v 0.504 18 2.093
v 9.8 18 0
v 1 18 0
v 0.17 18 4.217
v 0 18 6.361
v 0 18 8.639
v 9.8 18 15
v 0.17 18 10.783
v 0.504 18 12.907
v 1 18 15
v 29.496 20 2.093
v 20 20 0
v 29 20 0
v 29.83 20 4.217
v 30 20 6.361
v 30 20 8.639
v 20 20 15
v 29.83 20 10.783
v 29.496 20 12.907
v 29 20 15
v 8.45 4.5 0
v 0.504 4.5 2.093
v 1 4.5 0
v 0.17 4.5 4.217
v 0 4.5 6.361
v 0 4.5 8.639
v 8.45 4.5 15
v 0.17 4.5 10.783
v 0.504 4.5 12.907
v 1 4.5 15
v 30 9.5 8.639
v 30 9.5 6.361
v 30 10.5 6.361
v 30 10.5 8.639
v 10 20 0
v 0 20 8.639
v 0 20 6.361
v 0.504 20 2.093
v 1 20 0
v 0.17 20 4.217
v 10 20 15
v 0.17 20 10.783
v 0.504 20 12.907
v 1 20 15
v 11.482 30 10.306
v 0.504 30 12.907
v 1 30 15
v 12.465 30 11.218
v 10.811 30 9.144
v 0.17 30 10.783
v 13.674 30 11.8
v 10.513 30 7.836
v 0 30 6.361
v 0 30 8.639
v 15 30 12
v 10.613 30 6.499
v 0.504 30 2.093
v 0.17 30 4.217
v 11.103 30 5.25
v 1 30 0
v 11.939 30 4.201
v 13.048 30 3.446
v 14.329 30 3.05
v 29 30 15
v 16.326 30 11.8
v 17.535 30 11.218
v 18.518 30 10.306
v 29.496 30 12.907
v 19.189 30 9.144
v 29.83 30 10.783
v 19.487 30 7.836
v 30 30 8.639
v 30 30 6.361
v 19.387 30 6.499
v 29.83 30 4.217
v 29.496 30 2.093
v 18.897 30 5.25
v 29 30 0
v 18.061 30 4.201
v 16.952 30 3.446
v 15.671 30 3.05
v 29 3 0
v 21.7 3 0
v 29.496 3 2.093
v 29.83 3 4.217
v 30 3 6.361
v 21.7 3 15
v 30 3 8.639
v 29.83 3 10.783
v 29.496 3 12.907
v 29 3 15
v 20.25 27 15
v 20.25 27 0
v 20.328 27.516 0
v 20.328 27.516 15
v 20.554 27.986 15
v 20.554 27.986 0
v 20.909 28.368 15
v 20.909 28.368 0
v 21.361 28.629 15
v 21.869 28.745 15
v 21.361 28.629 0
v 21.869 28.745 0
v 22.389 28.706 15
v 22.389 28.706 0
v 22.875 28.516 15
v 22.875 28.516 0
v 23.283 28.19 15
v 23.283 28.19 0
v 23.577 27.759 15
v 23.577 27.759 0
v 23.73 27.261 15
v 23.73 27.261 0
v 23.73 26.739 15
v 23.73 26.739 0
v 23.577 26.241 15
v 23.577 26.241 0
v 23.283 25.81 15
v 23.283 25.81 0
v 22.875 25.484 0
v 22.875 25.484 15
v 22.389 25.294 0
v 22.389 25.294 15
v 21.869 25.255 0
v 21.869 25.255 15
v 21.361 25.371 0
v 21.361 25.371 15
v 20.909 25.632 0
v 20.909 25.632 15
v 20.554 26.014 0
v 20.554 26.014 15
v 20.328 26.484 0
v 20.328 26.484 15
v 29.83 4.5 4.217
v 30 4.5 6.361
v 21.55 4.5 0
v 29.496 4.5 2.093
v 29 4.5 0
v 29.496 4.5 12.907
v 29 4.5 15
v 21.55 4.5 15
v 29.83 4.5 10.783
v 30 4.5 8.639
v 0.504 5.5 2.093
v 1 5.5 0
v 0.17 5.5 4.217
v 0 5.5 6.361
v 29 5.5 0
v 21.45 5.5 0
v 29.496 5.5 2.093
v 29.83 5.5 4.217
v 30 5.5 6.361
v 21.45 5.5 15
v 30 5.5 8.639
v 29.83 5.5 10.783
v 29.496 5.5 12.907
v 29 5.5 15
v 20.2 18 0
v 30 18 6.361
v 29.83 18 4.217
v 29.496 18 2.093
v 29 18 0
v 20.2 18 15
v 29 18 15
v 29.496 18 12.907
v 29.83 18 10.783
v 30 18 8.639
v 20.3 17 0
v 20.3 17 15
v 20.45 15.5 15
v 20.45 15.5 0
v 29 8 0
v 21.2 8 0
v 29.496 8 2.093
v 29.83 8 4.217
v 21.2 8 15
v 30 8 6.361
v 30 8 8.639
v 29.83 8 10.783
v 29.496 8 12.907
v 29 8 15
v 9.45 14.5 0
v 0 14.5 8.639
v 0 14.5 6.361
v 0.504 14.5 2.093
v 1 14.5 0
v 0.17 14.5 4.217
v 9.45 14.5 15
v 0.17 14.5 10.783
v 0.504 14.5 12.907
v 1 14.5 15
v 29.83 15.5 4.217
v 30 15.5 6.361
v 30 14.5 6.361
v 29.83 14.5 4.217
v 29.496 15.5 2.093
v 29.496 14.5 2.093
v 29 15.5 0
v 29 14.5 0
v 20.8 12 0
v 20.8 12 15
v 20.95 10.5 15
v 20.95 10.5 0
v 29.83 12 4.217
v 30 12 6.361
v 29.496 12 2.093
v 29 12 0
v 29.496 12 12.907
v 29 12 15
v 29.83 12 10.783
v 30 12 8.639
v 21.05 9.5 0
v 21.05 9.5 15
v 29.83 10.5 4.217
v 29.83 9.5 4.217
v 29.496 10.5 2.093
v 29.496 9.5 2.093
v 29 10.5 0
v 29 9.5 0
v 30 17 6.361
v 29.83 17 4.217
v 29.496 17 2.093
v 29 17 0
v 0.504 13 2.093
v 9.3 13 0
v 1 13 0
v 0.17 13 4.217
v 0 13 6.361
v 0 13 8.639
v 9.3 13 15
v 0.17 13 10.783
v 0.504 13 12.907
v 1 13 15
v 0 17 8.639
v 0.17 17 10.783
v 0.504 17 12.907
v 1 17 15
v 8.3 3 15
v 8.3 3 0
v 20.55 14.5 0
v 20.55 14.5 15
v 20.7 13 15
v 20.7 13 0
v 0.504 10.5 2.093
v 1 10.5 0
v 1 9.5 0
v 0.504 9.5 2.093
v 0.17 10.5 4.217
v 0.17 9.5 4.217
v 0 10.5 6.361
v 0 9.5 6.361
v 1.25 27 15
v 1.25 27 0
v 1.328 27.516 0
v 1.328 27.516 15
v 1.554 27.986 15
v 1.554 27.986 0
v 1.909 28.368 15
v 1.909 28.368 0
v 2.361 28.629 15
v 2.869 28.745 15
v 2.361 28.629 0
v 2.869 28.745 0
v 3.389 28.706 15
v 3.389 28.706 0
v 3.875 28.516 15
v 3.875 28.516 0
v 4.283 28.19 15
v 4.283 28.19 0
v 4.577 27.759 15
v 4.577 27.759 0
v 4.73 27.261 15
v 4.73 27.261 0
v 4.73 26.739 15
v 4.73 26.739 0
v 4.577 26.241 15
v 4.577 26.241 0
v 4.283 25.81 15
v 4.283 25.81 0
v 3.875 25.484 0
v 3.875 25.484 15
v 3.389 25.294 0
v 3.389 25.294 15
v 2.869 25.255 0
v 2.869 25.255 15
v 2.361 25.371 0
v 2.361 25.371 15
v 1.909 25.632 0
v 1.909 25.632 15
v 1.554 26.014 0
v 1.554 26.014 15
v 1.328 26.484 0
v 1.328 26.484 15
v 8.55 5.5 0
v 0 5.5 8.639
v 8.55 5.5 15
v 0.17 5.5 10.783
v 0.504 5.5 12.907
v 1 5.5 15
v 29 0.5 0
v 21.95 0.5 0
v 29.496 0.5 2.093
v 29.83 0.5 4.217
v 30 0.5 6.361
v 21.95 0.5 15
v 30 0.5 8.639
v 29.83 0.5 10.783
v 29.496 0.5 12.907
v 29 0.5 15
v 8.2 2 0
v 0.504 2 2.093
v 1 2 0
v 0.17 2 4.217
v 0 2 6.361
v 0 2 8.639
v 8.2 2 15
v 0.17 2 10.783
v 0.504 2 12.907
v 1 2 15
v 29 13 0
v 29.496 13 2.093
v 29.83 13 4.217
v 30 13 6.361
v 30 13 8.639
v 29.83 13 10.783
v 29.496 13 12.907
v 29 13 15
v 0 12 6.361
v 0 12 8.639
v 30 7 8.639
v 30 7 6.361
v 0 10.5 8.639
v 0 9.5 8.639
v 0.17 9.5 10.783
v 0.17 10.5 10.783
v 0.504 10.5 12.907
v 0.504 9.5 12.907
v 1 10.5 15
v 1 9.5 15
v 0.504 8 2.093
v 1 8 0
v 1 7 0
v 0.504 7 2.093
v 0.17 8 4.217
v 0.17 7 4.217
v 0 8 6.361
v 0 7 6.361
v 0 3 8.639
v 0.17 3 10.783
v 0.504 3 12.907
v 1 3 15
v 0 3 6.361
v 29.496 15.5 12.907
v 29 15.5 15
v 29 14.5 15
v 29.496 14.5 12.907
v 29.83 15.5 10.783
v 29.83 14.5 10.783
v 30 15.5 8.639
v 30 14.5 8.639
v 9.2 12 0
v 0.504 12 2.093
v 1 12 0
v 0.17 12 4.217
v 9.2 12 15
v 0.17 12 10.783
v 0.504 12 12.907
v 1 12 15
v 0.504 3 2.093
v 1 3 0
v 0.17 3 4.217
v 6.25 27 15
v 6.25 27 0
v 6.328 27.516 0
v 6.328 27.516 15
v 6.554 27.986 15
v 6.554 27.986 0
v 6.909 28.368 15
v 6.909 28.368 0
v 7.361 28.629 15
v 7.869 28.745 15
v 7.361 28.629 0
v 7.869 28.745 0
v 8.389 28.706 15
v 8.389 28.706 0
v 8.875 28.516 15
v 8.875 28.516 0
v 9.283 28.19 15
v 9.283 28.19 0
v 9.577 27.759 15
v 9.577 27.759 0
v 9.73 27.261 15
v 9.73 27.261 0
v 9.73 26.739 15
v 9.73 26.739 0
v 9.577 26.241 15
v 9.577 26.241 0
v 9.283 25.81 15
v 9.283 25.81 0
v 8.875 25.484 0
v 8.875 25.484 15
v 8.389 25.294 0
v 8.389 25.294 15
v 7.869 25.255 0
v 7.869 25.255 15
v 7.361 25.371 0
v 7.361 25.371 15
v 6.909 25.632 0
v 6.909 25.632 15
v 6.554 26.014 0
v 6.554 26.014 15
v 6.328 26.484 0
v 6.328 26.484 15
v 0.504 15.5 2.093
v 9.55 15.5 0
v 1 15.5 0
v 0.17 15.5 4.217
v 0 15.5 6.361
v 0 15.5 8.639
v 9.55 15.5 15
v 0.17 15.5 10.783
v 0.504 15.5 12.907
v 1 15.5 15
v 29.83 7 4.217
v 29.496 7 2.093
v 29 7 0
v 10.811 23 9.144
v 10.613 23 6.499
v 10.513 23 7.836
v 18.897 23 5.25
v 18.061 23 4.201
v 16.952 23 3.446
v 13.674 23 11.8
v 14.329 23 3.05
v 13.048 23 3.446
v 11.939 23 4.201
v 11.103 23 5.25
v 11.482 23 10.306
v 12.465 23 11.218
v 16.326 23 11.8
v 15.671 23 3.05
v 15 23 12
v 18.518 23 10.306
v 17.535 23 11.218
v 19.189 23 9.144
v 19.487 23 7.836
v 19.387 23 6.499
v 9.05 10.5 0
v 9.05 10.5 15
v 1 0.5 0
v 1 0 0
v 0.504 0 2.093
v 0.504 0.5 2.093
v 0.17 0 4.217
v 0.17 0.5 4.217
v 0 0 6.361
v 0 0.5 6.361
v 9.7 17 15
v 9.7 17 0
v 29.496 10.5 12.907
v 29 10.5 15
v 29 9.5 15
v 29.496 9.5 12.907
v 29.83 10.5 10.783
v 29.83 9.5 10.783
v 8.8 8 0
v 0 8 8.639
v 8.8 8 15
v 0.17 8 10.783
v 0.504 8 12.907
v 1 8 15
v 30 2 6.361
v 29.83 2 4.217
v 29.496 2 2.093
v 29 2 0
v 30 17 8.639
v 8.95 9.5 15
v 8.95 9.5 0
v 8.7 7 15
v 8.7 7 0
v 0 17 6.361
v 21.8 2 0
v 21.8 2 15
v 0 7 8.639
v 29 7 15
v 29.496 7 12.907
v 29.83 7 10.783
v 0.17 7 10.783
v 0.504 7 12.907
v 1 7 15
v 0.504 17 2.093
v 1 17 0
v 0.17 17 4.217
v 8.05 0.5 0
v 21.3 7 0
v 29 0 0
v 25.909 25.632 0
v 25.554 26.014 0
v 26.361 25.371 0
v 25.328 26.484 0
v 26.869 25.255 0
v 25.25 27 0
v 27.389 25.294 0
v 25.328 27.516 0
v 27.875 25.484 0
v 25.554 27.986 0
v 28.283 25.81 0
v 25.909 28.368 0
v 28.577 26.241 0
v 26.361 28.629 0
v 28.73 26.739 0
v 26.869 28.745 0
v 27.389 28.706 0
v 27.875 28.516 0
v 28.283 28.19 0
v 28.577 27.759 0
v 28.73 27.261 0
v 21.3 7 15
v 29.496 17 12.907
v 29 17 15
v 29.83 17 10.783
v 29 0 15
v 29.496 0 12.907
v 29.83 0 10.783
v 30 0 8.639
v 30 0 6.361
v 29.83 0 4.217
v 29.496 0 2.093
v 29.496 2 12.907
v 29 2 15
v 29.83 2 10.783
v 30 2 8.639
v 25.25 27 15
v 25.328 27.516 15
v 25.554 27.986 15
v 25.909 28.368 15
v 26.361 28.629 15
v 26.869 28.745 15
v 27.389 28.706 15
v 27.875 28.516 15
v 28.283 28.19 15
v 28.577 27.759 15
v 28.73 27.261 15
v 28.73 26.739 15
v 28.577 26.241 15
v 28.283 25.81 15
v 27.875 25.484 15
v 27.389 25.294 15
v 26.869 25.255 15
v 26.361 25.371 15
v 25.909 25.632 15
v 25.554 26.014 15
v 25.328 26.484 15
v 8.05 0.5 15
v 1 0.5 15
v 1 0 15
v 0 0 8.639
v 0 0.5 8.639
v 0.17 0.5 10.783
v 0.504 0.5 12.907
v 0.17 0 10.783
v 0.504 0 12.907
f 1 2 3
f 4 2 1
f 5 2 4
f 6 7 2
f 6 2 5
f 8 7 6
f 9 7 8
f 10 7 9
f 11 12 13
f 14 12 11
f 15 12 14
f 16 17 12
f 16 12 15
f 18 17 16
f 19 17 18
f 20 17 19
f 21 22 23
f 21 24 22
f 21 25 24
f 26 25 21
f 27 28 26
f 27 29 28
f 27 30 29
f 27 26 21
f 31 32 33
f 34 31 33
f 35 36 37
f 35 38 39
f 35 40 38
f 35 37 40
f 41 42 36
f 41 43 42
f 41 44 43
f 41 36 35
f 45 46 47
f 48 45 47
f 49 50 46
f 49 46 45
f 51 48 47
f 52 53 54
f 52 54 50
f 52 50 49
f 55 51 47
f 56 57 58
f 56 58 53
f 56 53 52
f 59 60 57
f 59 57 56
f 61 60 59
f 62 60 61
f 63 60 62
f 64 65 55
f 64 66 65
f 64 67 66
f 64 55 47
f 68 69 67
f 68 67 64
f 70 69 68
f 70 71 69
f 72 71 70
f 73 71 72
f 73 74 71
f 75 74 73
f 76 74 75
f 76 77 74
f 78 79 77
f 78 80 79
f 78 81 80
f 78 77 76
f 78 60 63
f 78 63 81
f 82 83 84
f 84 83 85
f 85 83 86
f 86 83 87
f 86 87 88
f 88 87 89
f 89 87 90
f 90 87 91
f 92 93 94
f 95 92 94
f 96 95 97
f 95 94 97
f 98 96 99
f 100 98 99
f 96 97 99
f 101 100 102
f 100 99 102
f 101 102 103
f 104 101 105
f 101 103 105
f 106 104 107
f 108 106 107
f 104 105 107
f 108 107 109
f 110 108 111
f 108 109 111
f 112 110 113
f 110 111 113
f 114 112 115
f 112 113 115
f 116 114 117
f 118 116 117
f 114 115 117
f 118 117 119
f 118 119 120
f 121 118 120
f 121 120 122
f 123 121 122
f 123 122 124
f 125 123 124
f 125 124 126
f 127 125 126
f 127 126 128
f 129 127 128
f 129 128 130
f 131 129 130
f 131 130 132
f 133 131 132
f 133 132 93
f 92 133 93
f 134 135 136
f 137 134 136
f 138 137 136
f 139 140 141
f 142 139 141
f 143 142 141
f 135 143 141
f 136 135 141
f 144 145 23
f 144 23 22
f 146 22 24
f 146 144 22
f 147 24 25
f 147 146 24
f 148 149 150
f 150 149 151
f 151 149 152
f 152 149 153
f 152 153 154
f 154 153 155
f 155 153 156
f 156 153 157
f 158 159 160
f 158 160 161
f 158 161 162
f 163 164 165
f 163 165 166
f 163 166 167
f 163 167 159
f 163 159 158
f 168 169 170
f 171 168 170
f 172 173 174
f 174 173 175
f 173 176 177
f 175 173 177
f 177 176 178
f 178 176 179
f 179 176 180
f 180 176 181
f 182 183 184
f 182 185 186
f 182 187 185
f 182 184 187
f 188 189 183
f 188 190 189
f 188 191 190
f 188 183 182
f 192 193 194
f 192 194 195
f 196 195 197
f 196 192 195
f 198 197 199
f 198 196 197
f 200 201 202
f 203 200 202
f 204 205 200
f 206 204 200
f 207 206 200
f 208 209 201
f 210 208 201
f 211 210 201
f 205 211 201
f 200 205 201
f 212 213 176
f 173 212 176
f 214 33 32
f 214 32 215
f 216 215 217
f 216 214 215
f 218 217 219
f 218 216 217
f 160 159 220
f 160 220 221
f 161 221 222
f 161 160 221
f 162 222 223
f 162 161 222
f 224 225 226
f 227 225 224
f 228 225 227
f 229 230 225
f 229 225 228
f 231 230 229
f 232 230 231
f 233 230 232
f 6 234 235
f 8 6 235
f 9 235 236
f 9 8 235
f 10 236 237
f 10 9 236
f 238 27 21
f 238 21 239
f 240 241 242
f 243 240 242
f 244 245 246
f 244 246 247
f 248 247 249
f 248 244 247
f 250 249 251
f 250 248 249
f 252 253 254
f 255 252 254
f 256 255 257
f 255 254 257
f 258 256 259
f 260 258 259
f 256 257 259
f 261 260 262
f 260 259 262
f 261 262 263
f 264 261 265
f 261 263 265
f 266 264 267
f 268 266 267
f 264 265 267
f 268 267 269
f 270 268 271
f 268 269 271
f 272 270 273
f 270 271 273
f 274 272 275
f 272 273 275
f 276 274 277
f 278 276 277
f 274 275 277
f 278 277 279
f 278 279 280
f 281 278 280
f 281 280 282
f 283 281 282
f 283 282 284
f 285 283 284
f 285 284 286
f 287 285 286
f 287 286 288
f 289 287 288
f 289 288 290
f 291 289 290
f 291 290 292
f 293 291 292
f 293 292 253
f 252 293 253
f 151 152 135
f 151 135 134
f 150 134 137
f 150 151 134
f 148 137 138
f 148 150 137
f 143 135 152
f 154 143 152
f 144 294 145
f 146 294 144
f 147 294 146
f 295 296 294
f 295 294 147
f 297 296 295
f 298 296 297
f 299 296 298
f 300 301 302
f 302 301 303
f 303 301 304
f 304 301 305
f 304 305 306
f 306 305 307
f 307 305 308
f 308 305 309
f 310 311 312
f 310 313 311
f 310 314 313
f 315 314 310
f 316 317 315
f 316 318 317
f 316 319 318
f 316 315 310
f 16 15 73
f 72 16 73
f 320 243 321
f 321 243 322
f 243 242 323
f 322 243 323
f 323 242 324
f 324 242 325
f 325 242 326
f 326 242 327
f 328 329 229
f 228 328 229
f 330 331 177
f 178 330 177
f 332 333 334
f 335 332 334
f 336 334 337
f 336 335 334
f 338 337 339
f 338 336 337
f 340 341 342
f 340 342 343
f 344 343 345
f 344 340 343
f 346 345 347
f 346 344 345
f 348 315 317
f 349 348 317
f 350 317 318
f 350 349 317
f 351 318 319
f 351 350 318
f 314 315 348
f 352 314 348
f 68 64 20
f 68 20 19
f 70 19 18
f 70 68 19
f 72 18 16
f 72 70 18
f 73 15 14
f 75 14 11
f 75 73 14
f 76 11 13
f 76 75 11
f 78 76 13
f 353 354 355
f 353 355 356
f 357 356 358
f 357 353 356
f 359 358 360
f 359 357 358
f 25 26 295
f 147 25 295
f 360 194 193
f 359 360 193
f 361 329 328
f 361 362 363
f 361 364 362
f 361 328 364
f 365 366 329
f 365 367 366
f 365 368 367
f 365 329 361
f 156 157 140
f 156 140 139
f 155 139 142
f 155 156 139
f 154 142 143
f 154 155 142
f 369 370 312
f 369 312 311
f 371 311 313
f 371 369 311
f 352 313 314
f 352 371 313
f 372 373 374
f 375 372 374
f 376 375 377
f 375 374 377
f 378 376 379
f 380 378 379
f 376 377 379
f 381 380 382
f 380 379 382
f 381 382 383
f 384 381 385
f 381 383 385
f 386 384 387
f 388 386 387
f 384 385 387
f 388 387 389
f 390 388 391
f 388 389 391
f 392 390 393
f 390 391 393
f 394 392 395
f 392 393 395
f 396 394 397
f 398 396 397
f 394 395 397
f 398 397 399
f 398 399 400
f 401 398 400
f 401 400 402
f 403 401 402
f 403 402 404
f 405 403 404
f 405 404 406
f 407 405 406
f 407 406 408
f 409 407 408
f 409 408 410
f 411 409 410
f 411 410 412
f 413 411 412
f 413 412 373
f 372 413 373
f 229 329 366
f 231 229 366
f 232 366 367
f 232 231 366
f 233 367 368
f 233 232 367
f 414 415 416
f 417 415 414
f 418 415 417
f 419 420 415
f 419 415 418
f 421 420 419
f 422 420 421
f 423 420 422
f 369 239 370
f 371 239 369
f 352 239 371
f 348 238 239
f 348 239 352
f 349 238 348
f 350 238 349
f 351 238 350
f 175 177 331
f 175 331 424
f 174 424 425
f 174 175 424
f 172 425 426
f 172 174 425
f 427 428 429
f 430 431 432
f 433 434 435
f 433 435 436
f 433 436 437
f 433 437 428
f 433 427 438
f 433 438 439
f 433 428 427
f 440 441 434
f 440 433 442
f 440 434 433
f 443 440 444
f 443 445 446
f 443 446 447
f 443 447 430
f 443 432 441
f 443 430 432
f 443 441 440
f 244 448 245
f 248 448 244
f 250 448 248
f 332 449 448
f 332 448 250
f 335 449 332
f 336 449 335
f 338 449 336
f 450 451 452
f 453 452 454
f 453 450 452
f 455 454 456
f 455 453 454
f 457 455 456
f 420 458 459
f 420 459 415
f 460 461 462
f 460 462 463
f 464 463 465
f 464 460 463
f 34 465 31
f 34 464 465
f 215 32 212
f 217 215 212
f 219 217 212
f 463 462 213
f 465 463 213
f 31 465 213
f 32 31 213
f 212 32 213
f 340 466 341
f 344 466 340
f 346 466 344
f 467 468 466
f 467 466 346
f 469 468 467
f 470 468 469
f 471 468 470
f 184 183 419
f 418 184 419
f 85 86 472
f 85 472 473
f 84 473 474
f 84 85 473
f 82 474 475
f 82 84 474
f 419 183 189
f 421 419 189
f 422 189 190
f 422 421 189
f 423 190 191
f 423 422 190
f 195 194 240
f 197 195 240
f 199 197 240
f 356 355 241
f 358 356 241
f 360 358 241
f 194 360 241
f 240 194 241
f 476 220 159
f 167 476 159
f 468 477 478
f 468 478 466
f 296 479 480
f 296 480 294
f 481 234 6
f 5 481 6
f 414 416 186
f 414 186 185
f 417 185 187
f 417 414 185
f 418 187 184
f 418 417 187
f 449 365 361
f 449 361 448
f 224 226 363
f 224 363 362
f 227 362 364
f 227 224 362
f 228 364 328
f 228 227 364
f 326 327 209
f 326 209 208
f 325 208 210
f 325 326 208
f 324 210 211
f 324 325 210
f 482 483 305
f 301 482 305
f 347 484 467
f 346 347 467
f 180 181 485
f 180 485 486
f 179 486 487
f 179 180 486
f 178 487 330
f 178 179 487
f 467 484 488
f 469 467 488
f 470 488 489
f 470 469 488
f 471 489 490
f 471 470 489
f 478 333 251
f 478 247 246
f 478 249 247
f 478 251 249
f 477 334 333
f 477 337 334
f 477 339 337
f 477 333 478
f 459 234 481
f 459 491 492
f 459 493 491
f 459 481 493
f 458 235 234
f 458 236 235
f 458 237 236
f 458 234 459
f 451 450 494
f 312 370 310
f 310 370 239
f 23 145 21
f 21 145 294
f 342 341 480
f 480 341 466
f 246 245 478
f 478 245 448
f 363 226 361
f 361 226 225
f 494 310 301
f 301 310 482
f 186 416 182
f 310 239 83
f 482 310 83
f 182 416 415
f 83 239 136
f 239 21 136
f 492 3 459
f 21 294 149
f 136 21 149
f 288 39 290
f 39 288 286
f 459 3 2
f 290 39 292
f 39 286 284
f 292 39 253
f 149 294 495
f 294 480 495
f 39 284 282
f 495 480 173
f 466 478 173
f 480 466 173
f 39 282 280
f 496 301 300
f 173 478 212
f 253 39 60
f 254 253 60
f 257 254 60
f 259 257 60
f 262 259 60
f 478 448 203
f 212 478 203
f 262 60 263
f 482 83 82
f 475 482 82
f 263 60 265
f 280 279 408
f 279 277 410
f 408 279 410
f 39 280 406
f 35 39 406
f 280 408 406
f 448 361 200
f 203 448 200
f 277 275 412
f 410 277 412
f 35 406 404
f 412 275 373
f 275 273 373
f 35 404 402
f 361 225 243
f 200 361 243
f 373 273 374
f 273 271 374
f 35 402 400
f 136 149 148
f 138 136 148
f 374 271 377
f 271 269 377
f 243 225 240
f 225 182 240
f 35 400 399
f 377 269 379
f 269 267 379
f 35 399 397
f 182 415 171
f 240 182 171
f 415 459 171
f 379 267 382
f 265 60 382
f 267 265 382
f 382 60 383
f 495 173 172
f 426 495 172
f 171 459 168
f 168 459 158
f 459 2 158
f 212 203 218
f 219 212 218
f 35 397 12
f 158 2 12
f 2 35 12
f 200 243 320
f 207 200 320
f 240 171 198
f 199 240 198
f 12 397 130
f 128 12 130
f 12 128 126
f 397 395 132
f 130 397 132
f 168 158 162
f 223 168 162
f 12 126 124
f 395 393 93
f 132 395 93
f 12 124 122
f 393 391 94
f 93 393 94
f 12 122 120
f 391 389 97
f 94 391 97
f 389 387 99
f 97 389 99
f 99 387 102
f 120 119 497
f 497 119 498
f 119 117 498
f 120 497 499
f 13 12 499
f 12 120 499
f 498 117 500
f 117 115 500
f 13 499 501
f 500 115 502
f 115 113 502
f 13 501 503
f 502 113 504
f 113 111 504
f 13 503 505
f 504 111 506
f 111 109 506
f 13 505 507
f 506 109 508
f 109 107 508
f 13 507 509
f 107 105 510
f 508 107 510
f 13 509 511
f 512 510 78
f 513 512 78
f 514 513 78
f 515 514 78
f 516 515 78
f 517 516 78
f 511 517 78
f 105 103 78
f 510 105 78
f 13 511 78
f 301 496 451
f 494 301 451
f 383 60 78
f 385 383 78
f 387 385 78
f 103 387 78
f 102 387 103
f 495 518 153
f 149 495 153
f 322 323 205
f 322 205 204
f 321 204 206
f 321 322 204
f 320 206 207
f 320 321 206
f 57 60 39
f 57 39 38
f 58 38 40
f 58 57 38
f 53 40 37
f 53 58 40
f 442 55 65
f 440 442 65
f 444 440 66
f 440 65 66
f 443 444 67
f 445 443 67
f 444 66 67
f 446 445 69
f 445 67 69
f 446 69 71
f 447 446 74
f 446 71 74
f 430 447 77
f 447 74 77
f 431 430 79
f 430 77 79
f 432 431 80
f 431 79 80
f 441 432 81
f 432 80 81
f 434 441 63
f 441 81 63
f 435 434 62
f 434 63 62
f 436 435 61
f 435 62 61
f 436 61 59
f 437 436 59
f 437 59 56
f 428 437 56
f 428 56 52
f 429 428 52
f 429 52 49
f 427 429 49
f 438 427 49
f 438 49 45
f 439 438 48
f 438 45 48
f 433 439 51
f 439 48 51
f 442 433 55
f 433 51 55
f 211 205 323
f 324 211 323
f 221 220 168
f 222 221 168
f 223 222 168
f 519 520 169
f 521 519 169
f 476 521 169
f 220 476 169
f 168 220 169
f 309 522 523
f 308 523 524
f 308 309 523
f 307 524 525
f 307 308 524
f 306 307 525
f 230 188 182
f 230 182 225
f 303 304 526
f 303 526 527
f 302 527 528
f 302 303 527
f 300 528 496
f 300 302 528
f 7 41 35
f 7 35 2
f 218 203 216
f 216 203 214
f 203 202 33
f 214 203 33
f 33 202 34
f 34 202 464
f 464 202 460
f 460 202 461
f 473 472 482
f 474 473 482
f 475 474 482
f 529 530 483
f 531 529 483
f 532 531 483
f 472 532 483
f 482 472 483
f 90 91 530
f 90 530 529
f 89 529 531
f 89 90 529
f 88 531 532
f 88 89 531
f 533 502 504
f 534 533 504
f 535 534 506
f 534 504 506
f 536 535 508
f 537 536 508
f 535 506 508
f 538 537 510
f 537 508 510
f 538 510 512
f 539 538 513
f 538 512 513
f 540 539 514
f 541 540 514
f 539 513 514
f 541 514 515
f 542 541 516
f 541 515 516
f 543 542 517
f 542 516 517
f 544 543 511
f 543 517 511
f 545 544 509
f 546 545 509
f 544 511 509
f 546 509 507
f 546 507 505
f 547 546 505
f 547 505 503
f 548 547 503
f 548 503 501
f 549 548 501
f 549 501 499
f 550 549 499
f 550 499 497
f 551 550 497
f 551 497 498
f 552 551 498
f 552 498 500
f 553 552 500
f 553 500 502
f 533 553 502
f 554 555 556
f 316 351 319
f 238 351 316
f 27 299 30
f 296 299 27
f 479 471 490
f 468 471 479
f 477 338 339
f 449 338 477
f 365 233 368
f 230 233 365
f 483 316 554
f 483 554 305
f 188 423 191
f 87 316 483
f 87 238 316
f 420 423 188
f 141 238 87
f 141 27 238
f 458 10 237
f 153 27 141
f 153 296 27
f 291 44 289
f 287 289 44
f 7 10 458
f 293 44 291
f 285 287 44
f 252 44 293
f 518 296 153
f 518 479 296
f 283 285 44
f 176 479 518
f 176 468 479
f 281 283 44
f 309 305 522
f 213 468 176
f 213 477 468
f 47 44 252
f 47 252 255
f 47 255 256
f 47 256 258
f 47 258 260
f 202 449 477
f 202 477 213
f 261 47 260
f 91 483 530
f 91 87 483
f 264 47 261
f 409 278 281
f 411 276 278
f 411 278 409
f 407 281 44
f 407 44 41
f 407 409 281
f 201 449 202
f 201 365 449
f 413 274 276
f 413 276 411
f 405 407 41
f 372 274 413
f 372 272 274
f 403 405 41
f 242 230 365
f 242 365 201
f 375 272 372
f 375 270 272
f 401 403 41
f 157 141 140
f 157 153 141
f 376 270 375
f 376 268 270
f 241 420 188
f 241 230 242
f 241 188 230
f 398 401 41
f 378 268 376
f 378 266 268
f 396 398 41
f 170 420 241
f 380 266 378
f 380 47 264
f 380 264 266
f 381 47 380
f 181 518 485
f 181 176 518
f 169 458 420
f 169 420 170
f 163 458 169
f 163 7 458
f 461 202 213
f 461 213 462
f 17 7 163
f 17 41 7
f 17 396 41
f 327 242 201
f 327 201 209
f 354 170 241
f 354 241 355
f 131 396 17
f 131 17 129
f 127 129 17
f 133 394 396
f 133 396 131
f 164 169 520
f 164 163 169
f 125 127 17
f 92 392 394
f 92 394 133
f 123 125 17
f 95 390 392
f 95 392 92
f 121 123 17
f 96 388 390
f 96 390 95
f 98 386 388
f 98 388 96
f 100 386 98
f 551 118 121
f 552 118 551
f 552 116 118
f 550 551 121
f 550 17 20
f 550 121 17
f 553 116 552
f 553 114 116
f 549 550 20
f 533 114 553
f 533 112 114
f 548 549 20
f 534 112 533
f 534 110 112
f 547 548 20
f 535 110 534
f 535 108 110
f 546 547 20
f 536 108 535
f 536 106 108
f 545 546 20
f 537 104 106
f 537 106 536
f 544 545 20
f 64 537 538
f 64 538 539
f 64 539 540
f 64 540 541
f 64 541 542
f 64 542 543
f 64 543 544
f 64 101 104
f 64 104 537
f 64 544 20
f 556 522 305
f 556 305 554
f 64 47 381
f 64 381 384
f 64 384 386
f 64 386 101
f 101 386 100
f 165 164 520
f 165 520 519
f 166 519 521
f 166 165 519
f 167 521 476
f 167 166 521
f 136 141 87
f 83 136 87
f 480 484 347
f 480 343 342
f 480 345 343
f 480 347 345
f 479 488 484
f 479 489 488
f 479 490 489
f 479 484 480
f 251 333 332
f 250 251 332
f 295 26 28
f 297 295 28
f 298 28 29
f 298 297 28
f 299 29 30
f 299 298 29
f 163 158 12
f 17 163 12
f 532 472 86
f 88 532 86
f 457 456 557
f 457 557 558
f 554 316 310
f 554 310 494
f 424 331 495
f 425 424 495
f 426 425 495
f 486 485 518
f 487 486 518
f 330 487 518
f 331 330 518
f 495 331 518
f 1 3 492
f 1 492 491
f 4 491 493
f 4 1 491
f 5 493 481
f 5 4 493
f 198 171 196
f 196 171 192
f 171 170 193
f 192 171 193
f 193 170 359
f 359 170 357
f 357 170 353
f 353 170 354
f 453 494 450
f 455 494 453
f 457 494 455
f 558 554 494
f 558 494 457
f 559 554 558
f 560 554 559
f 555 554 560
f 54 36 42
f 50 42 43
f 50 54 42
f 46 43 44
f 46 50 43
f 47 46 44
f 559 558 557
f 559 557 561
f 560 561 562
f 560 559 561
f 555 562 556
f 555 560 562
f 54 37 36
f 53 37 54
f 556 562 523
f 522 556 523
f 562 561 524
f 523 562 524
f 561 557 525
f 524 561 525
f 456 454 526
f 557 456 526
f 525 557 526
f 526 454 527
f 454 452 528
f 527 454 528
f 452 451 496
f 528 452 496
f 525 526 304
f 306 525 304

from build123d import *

# Parameters (mm, degrees)
SKETCH_1_W              = 30
SKETCH_1_H              = 30
EXTRUDE_1_DEPTH         = 15
HOLE_WIZARD_3_5_3_5_1_D = 3.5
CUT_EXTRUDE_1_DEPTH     = 46
CUT_EXTRUDE_2_REACH     = 47
SKETCH_6_R              = 4.5
CUT_EXTRUDE_3_DEPTH     = 7


with BuildPart() as part:
    # Эскиз1 → Бобышка-Вытянуть1 (new body)
    with BuildSketch(Plane.XY):
        with Locations((15, 15)):
            Rectangle(SKETCH_1_W, SKETCH_1_H)
    extrude(amount=EXTRUDE_1_DEPTH)

    # Диаметр отверстия Ø3.5 (3.5)1 (through all)
    with Locations(Plane.XY.offset(15)):
        with Locations((3, 27), (8, 27), (22, 27), (27, 27)):
            Hole(HOLE_WIZARD_3_5_3_5_1_D / 2)

    # Эскиз4 → Вырез-Вытянуть1 (cut, through all)
    with BuildSketch(Plane.XY.offset(15)):
        Polygon((0, 14.5), (9.45, 14.5), (9.3, 13), (0, 13), align=None)
        Polygon((0, 20), (10, 20), (9.8, 18), (0, 18), align=None)
        Polygon((0, 17), (9.7, 17), (9.55, 15.5), (0, 15.5), align=None)
        Polygon((0, 12), (9.2, 12), (9.05, 10.5), (0, 10.5), align=None)
        Polygon((0, 9.5), (8.95, 9.5), (8.8, 8), (0, 8), align=None)
        Polygon((0, 7), (8.7, 7), (8.55, 5.5), (0, 5.5), align=None)
        Polygon((0, 4.5), (8.45, 4.5), (8.3, 3), (0, 3), align=None)
        Polygon((0, 2), (8.2, 2), (8.05, 0.5), (0, 0.5), align=None)
        Polygon((21.8, 2), (21.95, 0.5), (30, 0.5), (30, 2), align=None)
        Polygon((21.55, 4.5), (21.7, 3), (30, 3), (30, 4.5), align=None)
        Polygon((21.3, 7), (21.45, 5.5), (30, 5.5), (30, 7), align=None)
        Polygon((21.05, 9.5), (21.2, 8), (30, 8), (30, 9.5), align=None)
        Polygon((20.8, 12), (20.95, 10.5), (30, 10.5), (30, 12), align=None)
        Polygon((20.55, 14.5), (20.7, 13), (30, 13), (30, 14.5), align=None)
        Polygon((20.3, 17), (20.45, 15.5), (30, 15.5), (30, 17), align=None)
        Polygon((30, 18), (20.2, 18), (20, 20), (30, 20), align=None)
    extrude(amount=-CUT_EXTRUDE_1_DEPTH, mode=Mode.SUBTRACT)

    # Вырез-Вытянуть2: up to this face of the body (flat: up to its plane)
    cut_extrude_2_end = Plane(part.part.faces().sort_by_distance((15, 0, 7.5))[0])
    # Эскиз5 → Вырез-Вытянуть2 (cut, up to the picked face)
    with BuildSketch(Plane(origin=(0, 30, 0), x_dir=(1, 0, 0), z_dir=(0, 1, 0)), mode=Mode.PRIVATE) as cut_extrude_2_sk1:
        with BuildLine():
            Line((30.335027773, 0), (30.335027773, -15))
            Line((30.335027773, -15), (29, -15))
            ThreePointArc((29, -15), (30.02315808, -7.5), (29, 0))
            Line((29, 0), (30.335027773, 0))
        make_face()
    cut_extrude_2_tool1 = split(extrude(cut_extrude_2_sk1.sketch, amount=-CUT_EXTRUDE_2_REACH, mode=Mode.PRIVATE), bisect_by=cut_extrude_2_end, keep=Keep.BOTH, mode=Mode.PRIVATE)
    # Эскиз5 → Вырез-Вытянуть2 (cut, up to the picked face)
    with BuildSketch(Plane(origin=(0, 30, 0), x_dir=(1, 0, 0), z_dir=(0, 1, 0)), mode=Mode.PRIVATE) as cut_extrude_2_sk2:
        with BuildLine():
            Line((-0.335027773, 0), (1, 0))
            ThreePointArc((1, 0), (-0.02315808, -7.5), (1, -15))
            Line((1, -15), (-0.335027773, -15))
            Line((-0.335027773, -15), (-0.335027773, 0))
        make_face()
    cut_extrude_2_tool2 = split(extrude(cut_extrude_2_sk2.sketch, amount=-CUT_EXTRUDE_2_REACH, mode=Mode.PRIVATE), bisect_by=cut_extrude_2_end, keep=Keep.BOTH, mode=Mode.PRIVATE)
    add(cut_extrude_2_tool1.solids().sort_by(Axis((29.667514, 30, 0.150593), (0, -1, 0)))[0], mode=Mode.SUBTRACT)
    add(cut_extrude_2_tool2.solids().sort_by(Axis((0.332486, 30, 14.849407), (0, -1, 0)))[0], mode=Mode.SUBTRACT)

    # Эскиз6 → Вырез-Вытянуть3 (cut)
    with BuildSketch(Plane(origin=(0, 30, 0), x_dir=(1, 0, 0), z_dir=(0, 1, 0))):
        with Locations(Location((15, -7.5, 0), (0, 0, 270))):
            Circle(SKETCH_6_R)
    extrude(amount=-CUT_EXTRUDE_3_DEPTH, mode=Mode.SUBTRACT)


solid = part.part
